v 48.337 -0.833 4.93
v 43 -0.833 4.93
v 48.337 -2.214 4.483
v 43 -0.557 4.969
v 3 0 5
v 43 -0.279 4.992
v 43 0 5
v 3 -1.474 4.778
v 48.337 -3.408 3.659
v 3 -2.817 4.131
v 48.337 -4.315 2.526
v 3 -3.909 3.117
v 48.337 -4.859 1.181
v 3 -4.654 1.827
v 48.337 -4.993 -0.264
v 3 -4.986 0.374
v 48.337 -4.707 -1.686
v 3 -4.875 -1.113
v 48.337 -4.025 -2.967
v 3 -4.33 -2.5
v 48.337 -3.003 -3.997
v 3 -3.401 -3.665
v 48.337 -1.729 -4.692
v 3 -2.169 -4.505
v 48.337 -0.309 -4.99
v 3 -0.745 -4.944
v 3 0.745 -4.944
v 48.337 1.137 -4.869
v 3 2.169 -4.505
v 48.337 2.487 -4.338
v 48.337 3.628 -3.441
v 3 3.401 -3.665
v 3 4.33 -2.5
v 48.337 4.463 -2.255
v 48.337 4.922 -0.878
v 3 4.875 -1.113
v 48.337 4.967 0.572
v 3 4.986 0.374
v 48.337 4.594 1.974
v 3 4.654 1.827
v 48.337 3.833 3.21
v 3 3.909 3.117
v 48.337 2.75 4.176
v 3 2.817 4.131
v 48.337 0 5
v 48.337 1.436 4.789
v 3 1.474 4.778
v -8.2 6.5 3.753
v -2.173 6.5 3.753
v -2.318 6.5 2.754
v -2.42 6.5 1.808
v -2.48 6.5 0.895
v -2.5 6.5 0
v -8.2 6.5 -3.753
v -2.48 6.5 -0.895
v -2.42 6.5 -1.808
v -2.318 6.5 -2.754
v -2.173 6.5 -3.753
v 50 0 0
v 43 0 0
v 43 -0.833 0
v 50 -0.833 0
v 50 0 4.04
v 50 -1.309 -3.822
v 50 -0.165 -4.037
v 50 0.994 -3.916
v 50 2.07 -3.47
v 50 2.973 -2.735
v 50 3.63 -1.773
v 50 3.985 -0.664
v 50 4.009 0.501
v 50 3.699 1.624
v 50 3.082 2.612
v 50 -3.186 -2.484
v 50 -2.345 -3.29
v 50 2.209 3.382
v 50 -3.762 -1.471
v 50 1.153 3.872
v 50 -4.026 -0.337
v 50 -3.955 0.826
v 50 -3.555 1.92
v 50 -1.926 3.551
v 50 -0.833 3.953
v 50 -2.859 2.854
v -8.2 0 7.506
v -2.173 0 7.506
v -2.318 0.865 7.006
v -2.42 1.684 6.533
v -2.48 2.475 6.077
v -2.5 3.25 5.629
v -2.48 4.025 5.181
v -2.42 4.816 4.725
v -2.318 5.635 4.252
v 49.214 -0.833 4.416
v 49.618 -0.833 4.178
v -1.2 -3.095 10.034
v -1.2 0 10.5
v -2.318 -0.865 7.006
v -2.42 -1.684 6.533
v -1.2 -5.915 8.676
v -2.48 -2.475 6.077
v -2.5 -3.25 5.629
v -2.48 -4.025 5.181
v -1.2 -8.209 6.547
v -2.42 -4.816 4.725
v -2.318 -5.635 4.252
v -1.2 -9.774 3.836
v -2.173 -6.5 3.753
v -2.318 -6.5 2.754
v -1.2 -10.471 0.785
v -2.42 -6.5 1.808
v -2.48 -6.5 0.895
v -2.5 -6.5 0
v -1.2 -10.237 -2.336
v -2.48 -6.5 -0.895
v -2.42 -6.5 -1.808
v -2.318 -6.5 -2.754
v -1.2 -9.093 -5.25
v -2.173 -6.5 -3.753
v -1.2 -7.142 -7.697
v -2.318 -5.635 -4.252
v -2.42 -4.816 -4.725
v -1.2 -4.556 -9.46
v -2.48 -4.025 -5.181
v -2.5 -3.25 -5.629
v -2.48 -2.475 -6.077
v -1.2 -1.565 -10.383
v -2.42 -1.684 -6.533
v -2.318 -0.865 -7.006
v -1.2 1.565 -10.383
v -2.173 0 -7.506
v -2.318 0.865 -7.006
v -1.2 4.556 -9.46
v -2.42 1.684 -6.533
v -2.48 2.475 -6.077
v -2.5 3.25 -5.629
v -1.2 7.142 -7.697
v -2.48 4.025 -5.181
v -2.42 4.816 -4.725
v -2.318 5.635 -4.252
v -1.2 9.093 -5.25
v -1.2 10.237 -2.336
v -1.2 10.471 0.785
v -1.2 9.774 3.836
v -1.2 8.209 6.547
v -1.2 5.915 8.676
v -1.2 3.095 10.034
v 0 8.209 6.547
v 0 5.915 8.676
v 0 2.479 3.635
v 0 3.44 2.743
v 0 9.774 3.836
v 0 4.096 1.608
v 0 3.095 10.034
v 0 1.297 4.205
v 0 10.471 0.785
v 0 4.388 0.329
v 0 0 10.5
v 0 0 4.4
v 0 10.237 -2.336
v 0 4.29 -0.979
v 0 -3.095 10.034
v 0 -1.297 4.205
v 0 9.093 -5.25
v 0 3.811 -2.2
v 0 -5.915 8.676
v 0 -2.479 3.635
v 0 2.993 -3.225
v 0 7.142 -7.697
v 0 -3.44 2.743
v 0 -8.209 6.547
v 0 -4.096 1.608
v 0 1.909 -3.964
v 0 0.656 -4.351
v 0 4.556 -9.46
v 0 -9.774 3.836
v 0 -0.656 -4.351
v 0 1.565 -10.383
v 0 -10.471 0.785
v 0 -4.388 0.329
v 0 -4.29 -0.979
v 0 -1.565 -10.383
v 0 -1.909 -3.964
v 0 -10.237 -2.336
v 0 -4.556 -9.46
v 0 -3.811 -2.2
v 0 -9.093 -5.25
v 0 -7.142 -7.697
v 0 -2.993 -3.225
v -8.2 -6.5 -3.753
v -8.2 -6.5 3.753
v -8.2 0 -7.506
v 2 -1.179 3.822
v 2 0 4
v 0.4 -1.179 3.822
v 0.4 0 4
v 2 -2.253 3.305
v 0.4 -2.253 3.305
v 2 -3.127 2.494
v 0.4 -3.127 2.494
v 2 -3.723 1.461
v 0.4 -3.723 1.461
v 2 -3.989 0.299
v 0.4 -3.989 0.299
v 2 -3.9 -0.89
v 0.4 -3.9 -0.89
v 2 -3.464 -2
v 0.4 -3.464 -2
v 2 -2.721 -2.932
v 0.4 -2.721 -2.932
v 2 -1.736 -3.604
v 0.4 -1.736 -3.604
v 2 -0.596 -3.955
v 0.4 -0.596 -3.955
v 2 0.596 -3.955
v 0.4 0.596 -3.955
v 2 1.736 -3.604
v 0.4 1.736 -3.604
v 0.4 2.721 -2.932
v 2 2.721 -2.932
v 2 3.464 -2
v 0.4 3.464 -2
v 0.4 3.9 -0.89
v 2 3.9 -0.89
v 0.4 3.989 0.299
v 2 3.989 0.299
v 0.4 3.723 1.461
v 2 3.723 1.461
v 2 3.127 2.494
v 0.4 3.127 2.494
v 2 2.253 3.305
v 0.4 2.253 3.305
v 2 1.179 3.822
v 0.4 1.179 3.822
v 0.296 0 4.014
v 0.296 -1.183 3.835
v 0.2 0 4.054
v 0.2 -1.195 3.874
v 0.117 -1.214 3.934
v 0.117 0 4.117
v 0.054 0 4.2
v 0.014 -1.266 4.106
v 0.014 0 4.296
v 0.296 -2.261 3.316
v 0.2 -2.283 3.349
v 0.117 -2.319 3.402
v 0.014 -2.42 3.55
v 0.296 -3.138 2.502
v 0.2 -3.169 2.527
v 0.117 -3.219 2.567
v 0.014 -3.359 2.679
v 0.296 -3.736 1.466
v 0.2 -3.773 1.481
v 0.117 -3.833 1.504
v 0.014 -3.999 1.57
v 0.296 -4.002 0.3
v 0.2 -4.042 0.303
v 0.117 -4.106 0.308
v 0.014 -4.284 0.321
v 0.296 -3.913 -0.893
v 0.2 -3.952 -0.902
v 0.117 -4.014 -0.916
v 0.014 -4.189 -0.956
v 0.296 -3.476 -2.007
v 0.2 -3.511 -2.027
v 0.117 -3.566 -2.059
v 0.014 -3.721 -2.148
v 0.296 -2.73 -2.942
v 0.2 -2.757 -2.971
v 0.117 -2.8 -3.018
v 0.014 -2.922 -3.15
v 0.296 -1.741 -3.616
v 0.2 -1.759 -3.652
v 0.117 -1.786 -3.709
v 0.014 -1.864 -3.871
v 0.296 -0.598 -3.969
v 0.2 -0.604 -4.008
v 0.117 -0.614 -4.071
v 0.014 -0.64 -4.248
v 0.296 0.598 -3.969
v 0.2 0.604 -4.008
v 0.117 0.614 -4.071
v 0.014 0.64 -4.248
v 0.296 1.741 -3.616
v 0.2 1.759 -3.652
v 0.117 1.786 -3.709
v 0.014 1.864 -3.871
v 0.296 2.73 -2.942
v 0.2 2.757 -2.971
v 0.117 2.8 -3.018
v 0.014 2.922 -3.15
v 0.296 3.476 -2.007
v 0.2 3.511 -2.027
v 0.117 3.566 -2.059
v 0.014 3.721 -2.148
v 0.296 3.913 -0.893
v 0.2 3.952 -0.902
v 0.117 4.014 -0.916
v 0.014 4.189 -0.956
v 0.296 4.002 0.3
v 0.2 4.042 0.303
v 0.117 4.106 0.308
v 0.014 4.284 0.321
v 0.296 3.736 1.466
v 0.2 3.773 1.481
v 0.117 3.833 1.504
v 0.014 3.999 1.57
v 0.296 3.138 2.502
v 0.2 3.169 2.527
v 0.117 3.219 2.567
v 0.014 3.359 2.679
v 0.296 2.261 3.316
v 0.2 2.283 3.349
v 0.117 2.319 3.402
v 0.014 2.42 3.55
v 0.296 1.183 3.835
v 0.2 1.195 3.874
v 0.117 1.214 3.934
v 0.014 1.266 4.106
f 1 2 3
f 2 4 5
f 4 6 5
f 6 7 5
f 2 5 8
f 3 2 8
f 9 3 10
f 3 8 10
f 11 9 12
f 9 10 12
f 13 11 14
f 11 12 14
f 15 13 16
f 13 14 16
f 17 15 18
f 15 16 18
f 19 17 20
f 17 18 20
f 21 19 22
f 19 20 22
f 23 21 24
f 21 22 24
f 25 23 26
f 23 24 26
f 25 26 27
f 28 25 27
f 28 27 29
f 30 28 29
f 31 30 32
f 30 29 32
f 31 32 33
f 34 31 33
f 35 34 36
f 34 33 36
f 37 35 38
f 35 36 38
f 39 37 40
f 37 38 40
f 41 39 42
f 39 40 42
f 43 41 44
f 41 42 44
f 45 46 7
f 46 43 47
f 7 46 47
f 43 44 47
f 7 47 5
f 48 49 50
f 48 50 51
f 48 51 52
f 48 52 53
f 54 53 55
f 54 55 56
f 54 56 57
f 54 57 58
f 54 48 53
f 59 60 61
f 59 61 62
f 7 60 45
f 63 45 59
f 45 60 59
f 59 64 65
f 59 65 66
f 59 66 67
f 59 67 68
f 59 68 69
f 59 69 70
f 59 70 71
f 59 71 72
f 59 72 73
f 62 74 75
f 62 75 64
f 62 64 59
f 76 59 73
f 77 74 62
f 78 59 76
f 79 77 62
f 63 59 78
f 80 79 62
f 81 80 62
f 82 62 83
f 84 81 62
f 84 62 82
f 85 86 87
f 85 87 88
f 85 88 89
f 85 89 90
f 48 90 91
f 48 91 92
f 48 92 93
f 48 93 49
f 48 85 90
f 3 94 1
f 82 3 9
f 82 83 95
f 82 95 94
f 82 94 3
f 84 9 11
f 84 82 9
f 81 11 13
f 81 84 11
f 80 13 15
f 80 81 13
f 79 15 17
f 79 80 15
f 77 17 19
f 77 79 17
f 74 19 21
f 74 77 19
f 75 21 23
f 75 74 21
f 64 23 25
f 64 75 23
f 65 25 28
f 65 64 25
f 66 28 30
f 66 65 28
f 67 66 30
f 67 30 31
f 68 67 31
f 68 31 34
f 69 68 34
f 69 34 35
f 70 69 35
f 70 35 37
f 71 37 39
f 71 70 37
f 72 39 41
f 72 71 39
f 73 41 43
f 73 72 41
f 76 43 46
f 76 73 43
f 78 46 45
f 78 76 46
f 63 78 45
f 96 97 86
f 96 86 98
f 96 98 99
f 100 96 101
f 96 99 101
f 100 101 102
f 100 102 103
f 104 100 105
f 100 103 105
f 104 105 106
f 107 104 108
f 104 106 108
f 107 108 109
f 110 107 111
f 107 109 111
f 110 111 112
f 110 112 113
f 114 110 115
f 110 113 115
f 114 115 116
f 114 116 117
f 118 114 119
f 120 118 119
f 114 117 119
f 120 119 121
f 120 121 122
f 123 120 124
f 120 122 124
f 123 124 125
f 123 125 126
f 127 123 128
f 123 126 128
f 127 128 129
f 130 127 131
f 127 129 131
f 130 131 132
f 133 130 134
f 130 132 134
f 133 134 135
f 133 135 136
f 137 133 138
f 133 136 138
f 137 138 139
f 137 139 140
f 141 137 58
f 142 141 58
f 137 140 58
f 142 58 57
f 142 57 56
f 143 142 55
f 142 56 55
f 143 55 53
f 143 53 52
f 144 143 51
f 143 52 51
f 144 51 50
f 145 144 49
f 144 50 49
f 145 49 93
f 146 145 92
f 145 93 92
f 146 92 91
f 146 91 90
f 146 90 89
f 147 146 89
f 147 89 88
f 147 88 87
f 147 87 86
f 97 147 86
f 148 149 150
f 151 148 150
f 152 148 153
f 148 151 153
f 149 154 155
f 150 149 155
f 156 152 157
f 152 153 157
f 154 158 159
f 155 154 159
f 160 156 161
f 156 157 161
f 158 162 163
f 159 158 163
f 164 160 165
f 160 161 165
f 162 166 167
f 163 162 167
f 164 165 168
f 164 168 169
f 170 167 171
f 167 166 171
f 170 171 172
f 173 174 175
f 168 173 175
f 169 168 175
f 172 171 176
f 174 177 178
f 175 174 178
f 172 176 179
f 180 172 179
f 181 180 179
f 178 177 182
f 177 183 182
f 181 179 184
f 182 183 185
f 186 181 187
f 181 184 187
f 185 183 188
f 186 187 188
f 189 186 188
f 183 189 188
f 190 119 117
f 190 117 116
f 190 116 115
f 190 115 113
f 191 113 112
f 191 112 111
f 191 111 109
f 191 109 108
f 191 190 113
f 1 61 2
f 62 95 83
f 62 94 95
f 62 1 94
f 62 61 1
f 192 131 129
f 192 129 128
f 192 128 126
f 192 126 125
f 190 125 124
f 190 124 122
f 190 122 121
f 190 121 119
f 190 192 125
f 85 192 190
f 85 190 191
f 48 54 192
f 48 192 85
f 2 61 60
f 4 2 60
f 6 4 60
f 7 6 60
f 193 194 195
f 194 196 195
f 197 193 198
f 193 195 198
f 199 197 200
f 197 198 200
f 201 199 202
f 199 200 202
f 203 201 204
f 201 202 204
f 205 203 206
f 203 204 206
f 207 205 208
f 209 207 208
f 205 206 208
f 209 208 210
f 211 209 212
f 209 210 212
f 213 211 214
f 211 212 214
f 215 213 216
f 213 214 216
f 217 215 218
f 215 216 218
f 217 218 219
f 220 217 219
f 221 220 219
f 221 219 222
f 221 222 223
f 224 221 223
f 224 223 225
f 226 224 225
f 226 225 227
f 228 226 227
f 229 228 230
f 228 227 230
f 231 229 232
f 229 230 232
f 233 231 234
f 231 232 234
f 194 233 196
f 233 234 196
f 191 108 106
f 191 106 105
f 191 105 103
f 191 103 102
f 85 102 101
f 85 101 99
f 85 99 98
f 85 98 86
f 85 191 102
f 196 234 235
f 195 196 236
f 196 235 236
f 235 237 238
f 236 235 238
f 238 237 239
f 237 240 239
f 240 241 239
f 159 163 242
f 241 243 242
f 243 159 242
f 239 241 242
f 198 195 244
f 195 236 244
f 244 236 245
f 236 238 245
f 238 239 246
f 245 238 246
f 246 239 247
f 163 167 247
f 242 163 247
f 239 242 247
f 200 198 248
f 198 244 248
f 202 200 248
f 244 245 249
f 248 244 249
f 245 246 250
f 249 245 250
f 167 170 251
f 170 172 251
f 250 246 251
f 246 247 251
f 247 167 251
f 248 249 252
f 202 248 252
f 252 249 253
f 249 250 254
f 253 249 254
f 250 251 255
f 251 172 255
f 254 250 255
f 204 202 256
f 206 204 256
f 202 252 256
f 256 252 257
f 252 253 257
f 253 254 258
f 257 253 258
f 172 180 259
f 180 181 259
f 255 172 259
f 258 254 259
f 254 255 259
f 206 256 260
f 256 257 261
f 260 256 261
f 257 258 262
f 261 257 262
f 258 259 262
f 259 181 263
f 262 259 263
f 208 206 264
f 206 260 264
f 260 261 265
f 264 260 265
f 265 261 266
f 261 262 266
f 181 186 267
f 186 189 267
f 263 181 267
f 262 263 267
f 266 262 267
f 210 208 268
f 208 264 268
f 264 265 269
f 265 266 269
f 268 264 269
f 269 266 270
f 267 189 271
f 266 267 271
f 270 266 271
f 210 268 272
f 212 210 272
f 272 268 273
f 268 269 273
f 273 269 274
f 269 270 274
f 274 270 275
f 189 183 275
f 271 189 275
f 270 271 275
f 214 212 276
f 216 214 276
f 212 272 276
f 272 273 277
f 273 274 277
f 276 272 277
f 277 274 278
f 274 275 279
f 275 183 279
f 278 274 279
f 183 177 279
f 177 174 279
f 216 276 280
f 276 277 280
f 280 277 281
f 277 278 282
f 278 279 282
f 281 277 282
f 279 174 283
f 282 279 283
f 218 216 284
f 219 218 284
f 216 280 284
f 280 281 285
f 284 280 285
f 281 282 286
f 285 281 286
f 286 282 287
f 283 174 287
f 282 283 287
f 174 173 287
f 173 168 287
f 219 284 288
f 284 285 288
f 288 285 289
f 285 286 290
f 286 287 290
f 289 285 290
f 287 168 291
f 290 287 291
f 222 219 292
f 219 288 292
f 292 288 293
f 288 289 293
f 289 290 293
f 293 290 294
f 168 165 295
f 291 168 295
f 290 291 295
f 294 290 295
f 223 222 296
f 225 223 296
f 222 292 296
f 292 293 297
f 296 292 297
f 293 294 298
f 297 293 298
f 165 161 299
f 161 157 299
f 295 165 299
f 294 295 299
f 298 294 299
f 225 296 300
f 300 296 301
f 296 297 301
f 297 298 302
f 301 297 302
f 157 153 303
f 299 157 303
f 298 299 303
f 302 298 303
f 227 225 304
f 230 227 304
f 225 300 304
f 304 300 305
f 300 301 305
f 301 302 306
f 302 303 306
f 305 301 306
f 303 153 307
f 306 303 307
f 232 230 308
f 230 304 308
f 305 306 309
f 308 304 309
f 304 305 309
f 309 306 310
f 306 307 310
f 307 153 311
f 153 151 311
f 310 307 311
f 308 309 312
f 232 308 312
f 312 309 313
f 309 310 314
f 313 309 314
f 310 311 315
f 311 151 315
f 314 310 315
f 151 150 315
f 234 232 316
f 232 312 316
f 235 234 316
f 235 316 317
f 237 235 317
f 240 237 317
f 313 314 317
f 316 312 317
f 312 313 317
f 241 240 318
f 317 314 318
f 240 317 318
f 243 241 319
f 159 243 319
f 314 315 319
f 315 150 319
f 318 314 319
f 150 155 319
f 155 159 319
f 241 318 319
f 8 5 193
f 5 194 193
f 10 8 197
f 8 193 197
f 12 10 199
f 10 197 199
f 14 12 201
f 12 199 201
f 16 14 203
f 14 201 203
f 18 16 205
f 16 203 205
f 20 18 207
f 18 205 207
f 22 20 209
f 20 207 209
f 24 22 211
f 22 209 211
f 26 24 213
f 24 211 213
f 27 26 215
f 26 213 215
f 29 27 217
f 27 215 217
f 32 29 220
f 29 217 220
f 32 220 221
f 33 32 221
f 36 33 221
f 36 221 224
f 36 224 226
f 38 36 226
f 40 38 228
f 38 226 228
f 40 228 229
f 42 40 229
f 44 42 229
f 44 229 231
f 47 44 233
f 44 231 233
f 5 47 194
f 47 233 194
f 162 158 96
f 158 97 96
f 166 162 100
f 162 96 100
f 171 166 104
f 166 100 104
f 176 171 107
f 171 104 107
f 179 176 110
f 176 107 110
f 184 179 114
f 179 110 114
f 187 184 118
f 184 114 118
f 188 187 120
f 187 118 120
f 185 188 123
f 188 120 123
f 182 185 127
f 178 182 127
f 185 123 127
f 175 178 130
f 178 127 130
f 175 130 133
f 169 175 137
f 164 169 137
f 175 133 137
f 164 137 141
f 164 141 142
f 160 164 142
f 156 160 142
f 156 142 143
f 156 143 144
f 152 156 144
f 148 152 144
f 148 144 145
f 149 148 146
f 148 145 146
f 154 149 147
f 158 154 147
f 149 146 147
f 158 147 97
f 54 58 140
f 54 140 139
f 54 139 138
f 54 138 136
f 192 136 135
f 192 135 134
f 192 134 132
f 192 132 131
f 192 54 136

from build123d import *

# Parameters (mm, degrees)
EXTRUDE1_REACH           = 62.064
SKETCH11_W               = 7
SKETCH11_H               = 0.833333333
POINT_CUT_EXTRUDE8_DEPTH = 53.158412553


with BuildPart() as part:
    # Sketch1 → base-Revolve (revolve)
    with BuildSketch(Plane.XY, mode=Mode.PRIVATE) as base_revolve_sk:
        with BuildLine():
            Line((0, 10.5), (-1.2, 10.5))
            Line((-1.2, 10.5), (-2.499678785, 6.5))
            Line((-2.499678785, 6.5), (-8.2, 6.5))
            Line((-8.2, 6.5), (-8.2, 0))
            Line((-8.2, 0), (-6.8, 0))
            Line((-6.8, 0), (0, 0))
            Line((0, 0), (50, 0))
            Line((50, 0), (50, 5))
            Line((50, 5), (3, 5))
            Line((3, 5), (2, 4))
            Line((2, 4), (0.4, 4))
            ThreePointArc((0.4, 4), (0.117157288, 4.117157288), (0, 4.4))
            Line((0, 4.4), (0, 10.5))
        make_face()
    revolve(base_revolve_sk.sketch.rotate(Axis((0, 0, 0), (1, 0, 0)), 90), axis=Axis((0, 0, 0), (1, 0, 0)))

    # Extrude1: up to this cone (the profile starts outside it)
    extrude1_end = Plane(origin=(-8.2, 0, 0), z_dir=(1, 0, 0)).offset(3.58834419) * Cone(3.078e-06, 181.50840806, 58.97565581, align=(Align.CENTER, Align.CENTER, Align.MIN), mode=Mode.PRIVATE)
    # Sketch15 → Extrude1 (add, up to the surface)
    with BuildSketch(Plane.ZY.offset(8.2), mode=Mode.PRIVATE) as extrude1_sk1:
        Polygon((-3.75277675, 6.5), (-7.505553499, 0), (-3.75277675, -6.5), (3.75277675, -6.5), (7.505553499, 0), (3.75277675, 6.5), align=None)
    extrude1_tool1 = extrude(extrude1_sk1.sketch, amount=-EXTRUDE1_REACH, mode=Mode.PRIVATE) - extrude1_end
    add(extrude1_tool1.solids().sort_by_distance((-8.2, 0, 0))[0])

    # Sketch8 → point_Cut-Revolve1 (revolve, cut)
    with BuildSketch(Plane.XY, mode=Mode.PRIVATE) as point_cut_revolve1_sk:
        Polygon((50, 0), (50.508, 0), (50.508, 5.508), (48.337231225, 5.508), (48.337231225, 5), (50, 4.04), align=None)
    revolve(point_cut_revolve1_sk.sketch.rotate(Axis((0, 0, 0), (1, 0, 0)), 90), axis=Axis((0, 0, 0), (1, 0, 0)), mode=Mode.SUBTRACT)

    # Sketch11 → point_Cut-Extrude8 (cut, through all)
    with BuildSketch(Plane.XY):
        with Locations((46.5, -0.416666667)):
            Rectangle(SKETCH11_W, SKETCH11_H)
    extrude(amount=POINT_CUT_EXTRUDE8_DEPTH, mode=Mode.SUBTRACT)


solid = part.part
